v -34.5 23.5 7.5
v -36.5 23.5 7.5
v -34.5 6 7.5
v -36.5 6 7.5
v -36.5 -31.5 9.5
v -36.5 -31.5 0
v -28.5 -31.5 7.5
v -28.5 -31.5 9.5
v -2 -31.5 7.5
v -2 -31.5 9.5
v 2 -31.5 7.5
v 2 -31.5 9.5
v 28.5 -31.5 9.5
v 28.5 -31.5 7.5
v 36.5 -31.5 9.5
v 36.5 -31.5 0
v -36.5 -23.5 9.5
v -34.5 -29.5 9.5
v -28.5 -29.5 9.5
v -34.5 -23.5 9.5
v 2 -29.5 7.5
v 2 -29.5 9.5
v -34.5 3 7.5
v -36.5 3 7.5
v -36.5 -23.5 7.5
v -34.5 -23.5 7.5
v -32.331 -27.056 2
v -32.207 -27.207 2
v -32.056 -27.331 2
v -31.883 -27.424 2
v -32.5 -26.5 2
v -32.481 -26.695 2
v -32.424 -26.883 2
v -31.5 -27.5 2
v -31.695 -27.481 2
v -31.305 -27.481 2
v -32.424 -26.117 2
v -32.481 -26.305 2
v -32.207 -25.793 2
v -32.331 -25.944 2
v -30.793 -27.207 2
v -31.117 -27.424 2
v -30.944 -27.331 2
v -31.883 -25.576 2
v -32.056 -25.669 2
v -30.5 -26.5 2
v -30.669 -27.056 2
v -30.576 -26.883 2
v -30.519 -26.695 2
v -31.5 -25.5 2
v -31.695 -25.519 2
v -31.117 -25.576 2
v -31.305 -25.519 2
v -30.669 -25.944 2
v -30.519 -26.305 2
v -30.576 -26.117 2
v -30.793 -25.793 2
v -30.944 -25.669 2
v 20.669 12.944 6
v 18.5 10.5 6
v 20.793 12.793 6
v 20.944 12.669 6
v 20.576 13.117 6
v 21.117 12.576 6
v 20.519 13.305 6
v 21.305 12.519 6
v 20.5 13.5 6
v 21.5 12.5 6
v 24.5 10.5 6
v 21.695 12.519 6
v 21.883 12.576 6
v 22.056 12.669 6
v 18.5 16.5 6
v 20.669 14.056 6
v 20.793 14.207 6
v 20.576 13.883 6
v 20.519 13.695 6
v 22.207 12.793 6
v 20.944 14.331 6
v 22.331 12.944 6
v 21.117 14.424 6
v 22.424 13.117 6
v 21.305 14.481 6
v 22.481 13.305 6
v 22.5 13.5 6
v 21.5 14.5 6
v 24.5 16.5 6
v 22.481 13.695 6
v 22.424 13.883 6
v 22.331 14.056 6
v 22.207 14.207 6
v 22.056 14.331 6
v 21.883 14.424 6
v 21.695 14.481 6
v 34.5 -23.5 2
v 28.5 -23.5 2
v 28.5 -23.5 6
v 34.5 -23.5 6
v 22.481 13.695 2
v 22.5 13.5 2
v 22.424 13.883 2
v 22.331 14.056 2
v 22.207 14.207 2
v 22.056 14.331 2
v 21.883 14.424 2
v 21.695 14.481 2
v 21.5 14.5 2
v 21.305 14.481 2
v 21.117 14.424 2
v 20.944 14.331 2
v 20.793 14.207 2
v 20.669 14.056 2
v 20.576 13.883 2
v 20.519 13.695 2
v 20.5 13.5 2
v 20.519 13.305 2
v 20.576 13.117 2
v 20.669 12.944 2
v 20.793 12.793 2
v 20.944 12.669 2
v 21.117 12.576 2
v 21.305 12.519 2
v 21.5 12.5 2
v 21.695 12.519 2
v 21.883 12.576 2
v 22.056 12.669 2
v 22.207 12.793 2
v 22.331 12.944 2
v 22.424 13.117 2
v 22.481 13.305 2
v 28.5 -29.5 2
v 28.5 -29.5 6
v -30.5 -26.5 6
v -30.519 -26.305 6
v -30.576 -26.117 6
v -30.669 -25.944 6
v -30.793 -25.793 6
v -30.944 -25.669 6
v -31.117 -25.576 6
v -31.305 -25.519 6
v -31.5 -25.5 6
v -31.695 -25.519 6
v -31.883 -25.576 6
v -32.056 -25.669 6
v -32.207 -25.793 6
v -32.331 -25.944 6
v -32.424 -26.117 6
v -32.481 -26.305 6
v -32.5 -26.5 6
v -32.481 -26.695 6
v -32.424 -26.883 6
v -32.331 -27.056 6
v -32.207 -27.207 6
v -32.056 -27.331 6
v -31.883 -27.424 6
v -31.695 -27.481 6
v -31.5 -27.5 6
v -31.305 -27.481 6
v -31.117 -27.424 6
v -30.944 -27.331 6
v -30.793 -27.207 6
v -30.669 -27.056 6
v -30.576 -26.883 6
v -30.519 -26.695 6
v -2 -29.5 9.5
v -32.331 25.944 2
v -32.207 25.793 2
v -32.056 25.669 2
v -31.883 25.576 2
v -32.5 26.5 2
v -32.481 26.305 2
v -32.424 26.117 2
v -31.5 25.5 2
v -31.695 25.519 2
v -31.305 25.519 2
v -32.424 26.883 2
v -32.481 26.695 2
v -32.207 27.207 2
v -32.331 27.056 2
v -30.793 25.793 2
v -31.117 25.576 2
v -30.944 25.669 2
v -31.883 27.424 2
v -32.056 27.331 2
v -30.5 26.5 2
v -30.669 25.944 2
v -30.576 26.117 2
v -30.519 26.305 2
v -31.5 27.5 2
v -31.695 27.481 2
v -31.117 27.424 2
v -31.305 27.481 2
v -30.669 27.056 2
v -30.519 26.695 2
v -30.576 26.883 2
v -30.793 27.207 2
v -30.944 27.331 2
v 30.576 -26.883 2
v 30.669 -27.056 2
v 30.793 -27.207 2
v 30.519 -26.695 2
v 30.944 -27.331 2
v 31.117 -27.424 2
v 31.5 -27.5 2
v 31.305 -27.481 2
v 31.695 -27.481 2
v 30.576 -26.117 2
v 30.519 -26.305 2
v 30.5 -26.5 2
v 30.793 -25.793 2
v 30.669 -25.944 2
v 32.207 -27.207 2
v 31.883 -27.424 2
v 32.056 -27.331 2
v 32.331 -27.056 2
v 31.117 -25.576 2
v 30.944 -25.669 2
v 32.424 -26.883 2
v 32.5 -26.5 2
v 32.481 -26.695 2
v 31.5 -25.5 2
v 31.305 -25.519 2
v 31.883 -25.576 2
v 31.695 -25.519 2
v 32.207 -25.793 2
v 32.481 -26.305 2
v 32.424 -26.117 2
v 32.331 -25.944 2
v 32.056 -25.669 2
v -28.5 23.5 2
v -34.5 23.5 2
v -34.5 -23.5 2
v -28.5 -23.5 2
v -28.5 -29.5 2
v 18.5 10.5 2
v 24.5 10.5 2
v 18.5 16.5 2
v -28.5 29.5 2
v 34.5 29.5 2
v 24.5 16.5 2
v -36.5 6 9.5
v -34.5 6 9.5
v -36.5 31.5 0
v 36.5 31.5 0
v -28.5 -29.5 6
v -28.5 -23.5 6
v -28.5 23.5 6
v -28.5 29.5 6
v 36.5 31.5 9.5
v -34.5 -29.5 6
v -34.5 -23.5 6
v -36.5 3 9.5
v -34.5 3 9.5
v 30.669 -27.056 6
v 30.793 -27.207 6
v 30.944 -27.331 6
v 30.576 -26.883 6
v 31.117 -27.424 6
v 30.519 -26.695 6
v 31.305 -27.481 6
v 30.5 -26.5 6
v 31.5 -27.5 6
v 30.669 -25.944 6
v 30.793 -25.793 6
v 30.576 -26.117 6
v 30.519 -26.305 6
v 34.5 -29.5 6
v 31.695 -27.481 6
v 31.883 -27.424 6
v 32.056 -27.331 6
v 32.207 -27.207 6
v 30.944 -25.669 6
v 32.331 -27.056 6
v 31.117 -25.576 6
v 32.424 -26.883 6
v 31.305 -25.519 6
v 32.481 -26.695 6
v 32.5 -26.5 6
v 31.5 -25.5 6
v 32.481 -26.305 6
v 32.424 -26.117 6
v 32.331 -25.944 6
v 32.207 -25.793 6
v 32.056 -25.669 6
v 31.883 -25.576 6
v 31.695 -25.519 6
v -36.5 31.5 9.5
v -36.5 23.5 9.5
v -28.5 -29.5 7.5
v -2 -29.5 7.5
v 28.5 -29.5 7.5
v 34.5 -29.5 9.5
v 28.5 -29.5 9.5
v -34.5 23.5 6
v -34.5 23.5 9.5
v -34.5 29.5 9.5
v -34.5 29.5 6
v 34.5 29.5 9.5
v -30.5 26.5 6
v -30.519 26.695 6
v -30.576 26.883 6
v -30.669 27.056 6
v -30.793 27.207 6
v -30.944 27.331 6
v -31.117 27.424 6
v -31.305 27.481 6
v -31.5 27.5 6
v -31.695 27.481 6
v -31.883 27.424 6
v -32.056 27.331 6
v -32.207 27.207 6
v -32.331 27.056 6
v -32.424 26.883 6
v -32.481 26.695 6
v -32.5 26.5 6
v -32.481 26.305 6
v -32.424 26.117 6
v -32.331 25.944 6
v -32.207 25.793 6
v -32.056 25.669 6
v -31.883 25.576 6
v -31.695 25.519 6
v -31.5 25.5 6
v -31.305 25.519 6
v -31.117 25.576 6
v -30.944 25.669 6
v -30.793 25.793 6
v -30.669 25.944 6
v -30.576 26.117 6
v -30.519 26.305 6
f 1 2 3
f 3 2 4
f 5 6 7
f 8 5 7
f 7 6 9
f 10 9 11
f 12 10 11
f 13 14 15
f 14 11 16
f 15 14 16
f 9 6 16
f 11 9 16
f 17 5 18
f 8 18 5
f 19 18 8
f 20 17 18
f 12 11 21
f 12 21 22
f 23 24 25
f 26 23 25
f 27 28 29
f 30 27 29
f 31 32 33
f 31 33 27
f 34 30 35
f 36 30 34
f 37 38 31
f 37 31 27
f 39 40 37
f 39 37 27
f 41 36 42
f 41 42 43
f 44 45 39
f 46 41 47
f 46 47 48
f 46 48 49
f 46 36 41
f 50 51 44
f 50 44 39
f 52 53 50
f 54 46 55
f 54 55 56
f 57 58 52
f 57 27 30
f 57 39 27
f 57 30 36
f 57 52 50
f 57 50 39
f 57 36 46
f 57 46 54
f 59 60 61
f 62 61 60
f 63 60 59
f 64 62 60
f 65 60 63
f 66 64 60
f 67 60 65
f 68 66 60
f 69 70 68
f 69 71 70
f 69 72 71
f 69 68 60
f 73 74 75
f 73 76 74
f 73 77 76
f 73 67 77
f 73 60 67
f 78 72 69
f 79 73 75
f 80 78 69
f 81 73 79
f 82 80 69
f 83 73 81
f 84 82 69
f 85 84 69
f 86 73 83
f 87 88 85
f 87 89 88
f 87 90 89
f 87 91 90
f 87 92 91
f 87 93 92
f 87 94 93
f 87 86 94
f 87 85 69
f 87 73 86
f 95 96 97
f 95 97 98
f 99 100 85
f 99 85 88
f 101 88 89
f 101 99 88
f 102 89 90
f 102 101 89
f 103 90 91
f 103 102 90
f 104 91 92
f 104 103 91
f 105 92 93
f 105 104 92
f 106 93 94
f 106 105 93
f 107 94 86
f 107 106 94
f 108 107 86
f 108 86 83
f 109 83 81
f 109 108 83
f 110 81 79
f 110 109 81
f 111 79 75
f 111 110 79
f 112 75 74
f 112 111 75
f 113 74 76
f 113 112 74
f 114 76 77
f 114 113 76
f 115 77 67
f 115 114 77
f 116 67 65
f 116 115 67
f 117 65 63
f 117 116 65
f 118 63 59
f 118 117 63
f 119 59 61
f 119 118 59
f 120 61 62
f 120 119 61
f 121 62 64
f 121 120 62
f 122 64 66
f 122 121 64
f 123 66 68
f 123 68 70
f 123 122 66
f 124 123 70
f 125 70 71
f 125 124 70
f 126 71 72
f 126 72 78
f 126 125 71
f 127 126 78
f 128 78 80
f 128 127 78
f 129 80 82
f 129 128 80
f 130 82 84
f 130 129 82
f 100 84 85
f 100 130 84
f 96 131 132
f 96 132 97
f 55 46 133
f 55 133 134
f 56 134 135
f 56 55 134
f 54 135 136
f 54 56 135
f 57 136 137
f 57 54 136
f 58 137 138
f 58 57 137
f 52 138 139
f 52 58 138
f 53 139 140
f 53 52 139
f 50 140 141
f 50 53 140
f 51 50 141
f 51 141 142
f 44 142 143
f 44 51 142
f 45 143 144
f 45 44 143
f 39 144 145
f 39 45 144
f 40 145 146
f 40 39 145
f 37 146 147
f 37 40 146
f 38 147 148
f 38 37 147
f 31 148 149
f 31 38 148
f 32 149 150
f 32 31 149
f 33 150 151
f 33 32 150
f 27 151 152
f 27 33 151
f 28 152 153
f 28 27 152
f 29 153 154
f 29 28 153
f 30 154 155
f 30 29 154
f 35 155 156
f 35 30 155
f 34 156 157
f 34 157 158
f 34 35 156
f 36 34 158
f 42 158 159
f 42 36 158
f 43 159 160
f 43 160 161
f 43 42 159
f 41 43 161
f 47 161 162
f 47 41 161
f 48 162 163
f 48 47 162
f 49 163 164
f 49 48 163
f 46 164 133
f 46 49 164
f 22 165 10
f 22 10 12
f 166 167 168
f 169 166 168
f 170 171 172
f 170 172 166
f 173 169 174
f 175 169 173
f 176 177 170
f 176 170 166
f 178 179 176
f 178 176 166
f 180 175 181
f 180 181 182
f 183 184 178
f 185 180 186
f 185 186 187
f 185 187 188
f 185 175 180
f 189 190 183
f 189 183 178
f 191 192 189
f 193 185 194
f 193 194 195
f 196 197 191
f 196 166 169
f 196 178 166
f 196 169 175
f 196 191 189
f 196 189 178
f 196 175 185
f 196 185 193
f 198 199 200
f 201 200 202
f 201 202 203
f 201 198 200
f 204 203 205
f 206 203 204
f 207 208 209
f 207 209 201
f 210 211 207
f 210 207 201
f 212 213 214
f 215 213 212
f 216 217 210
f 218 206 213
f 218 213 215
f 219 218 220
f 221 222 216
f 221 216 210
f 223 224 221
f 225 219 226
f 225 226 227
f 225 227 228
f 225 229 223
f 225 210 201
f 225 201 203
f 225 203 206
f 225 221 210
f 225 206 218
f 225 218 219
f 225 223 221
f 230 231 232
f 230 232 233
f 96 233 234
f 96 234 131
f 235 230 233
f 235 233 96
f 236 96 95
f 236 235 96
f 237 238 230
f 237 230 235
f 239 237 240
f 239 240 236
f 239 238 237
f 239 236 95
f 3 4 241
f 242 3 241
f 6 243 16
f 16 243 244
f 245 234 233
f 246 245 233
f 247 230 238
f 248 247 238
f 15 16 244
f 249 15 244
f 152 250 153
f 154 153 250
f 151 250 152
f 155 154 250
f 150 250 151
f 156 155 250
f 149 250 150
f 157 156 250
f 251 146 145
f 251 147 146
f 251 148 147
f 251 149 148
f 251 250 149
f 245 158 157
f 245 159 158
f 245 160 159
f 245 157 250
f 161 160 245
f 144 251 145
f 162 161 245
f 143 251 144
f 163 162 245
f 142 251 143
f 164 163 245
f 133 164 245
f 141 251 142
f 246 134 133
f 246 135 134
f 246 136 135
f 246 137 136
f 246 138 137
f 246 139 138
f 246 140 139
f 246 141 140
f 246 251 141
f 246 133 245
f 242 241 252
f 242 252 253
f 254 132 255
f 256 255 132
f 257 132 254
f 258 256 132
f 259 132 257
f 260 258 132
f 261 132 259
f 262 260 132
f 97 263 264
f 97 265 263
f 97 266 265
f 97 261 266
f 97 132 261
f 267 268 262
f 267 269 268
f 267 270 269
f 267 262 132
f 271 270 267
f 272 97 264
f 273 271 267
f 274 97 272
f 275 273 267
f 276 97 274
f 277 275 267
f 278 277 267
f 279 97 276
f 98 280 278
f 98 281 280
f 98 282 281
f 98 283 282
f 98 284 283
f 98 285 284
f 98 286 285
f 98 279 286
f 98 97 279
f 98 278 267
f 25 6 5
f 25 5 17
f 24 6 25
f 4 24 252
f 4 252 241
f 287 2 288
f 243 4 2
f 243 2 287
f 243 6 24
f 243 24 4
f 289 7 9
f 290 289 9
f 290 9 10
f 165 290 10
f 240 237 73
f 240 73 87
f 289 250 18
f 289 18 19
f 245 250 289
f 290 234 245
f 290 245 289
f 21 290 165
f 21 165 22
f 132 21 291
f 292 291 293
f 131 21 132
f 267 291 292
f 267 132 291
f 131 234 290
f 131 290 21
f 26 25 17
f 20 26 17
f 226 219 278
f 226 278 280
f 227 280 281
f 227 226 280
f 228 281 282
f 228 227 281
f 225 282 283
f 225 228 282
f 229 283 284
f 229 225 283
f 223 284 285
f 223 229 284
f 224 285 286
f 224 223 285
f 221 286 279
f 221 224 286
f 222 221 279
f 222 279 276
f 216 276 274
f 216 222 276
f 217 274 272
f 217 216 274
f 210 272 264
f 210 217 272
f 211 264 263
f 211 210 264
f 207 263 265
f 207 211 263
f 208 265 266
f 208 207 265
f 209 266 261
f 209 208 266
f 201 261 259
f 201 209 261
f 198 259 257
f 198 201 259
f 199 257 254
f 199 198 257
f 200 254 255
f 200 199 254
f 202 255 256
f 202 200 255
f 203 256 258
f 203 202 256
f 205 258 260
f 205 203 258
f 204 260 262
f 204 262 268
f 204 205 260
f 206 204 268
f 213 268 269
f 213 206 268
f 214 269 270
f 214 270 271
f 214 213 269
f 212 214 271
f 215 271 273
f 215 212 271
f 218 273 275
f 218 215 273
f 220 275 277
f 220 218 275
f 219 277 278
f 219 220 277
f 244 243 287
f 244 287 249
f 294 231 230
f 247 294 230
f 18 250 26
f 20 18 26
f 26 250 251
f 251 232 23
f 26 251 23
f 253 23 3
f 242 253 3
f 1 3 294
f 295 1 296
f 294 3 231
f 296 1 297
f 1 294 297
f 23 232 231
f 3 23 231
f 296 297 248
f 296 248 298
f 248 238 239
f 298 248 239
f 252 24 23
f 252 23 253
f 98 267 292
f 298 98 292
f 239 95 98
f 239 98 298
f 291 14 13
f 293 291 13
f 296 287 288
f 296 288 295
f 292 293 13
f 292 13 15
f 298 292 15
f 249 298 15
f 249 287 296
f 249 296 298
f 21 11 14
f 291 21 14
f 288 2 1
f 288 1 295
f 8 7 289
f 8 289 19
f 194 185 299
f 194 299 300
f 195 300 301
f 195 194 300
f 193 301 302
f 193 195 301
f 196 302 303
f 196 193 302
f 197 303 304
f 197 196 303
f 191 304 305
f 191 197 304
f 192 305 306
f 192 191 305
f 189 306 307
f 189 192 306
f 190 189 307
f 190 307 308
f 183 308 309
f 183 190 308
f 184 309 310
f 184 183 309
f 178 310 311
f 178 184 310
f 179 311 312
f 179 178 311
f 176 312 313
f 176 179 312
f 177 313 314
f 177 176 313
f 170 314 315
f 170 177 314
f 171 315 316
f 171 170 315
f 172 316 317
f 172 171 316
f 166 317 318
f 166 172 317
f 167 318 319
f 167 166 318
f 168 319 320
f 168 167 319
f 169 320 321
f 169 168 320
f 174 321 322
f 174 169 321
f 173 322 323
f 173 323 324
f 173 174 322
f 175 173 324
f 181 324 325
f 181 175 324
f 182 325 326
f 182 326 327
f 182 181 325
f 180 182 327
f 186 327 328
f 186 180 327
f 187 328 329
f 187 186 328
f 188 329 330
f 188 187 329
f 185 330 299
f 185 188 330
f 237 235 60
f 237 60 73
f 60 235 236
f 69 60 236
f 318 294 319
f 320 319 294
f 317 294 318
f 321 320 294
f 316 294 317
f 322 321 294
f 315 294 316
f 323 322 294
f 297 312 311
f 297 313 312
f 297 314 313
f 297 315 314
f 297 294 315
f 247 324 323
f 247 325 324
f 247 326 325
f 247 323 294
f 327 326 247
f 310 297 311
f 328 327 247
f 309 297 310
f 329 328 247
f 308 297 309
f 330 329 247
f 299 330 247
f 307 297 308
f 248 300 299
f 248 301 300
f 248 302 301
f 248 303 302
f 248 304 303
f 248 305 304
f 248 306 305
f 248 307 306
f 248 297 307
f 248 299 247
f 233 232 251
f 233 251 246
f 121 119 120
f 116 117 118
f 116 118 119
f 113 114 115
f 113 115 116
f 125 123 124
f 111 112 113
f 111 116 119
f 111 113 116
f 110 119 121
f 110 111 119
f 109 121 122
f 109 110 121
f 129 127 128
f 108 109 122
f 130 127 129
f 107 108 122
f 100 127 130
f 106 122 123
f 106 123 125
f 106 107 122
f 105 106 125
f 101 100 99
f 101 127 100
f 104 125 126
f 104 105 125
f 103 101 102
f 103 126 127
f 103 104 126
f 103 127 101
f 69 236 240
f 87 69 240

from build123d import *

# Parameters (mm, degrees)
F3_W      = 73
F3_H      = 63
F3_W_2    = 69
F3_H_2    = 59
F4_DEPTH  = 9.5
F5_DEPTH  = 2
F6_W      = 6
F6_H      = 6
F6_R      = 1
F7_DEPTH  = 4
F8_W      = 26.5
F8_H      = 2
F9_DEPTH  = 2
F10_W     = 26.5
F10_H     = 2
F10_W_2   = 17.5
F11_DEPTH = 2


with BuildPart() as f4:
    # F3 (on Top) → F4 (new body)
    with BuildSketch(Plane.XY):
        Rectangle(F3_W, F3_H)
        Rectangle(F3_W_2, F3_H_2, mode=Mode.SUBTRACT)
    extrude(amount=F4_DEPTH)

    # F3 (on Top) → F5 (join)
    with BuildSketch(Plane.XY):
        Rectangle(F3_W_2, F3_H_2)
    extrude(amount=F5_DEPTH)

    # F6 (on face) → F7 (join)
    with BuildSketch(Plane.XY.offset(2)):
        with Locations((21.5, 13.5)):
            Rectangle(F6_W, F6_H)
        with Locations((21.5, 13.5)):
            Circle(F6_R, mode=Mode.SUBTRACT)
        with Locations((31.5, -26.5)):
            Rectangle(F6_W, F6_H)
        with Locations((31.5, -26.5)):
            Circle(F6_R, mode=Mode.SUBTRACT)
        with Locations((-31.5, 26.5)):
            Rectangle(F6_W, F6_H)
        with Locations((-31.5, 26.5)):
            Circle(F6_R, mode=Mode.SUBTRACT)
        with Locations((-31.5, -26.5)):
            Rectangle(F6_W, F6_H)
        with Locations((-31.5, -26.5)):
            Circle(F6_R, mode=Mode.SUBTRACT)
    extrude(amount=F7_DEPTH)

    # F8 (on face) → F9 (cut, through all)
    with BuildSketch(Plane.XZ.offset(31.5)):
        with Locations((15.25, 8.5)):
            Rectangle(F8_W, F8_H)
        with Locations((-15.25, 8.5)):
            Rectangle(F8_W, F8_H)
    extrude(amount=-F9_DEPTH, mode=Mode.SUBTRACT)

    # F10 (on face) → F11 (cut, through all)
    with BuildSketch(Plane(origin=(-36.5, 0, 0), x_dir=(0, -1, 0), z_dir=(-1, 0, 0))):
        with Locations((10.25, 8.5)):
            Rectangle(F10_W, F10_H)
        with Locations((-14.75, 8.5)):
            Rectangle(F10_W_2, F10_H)
    extrude(amount=-F11_DEPTH, mode=Mode.SUBTRACT)


solid = f4.part
